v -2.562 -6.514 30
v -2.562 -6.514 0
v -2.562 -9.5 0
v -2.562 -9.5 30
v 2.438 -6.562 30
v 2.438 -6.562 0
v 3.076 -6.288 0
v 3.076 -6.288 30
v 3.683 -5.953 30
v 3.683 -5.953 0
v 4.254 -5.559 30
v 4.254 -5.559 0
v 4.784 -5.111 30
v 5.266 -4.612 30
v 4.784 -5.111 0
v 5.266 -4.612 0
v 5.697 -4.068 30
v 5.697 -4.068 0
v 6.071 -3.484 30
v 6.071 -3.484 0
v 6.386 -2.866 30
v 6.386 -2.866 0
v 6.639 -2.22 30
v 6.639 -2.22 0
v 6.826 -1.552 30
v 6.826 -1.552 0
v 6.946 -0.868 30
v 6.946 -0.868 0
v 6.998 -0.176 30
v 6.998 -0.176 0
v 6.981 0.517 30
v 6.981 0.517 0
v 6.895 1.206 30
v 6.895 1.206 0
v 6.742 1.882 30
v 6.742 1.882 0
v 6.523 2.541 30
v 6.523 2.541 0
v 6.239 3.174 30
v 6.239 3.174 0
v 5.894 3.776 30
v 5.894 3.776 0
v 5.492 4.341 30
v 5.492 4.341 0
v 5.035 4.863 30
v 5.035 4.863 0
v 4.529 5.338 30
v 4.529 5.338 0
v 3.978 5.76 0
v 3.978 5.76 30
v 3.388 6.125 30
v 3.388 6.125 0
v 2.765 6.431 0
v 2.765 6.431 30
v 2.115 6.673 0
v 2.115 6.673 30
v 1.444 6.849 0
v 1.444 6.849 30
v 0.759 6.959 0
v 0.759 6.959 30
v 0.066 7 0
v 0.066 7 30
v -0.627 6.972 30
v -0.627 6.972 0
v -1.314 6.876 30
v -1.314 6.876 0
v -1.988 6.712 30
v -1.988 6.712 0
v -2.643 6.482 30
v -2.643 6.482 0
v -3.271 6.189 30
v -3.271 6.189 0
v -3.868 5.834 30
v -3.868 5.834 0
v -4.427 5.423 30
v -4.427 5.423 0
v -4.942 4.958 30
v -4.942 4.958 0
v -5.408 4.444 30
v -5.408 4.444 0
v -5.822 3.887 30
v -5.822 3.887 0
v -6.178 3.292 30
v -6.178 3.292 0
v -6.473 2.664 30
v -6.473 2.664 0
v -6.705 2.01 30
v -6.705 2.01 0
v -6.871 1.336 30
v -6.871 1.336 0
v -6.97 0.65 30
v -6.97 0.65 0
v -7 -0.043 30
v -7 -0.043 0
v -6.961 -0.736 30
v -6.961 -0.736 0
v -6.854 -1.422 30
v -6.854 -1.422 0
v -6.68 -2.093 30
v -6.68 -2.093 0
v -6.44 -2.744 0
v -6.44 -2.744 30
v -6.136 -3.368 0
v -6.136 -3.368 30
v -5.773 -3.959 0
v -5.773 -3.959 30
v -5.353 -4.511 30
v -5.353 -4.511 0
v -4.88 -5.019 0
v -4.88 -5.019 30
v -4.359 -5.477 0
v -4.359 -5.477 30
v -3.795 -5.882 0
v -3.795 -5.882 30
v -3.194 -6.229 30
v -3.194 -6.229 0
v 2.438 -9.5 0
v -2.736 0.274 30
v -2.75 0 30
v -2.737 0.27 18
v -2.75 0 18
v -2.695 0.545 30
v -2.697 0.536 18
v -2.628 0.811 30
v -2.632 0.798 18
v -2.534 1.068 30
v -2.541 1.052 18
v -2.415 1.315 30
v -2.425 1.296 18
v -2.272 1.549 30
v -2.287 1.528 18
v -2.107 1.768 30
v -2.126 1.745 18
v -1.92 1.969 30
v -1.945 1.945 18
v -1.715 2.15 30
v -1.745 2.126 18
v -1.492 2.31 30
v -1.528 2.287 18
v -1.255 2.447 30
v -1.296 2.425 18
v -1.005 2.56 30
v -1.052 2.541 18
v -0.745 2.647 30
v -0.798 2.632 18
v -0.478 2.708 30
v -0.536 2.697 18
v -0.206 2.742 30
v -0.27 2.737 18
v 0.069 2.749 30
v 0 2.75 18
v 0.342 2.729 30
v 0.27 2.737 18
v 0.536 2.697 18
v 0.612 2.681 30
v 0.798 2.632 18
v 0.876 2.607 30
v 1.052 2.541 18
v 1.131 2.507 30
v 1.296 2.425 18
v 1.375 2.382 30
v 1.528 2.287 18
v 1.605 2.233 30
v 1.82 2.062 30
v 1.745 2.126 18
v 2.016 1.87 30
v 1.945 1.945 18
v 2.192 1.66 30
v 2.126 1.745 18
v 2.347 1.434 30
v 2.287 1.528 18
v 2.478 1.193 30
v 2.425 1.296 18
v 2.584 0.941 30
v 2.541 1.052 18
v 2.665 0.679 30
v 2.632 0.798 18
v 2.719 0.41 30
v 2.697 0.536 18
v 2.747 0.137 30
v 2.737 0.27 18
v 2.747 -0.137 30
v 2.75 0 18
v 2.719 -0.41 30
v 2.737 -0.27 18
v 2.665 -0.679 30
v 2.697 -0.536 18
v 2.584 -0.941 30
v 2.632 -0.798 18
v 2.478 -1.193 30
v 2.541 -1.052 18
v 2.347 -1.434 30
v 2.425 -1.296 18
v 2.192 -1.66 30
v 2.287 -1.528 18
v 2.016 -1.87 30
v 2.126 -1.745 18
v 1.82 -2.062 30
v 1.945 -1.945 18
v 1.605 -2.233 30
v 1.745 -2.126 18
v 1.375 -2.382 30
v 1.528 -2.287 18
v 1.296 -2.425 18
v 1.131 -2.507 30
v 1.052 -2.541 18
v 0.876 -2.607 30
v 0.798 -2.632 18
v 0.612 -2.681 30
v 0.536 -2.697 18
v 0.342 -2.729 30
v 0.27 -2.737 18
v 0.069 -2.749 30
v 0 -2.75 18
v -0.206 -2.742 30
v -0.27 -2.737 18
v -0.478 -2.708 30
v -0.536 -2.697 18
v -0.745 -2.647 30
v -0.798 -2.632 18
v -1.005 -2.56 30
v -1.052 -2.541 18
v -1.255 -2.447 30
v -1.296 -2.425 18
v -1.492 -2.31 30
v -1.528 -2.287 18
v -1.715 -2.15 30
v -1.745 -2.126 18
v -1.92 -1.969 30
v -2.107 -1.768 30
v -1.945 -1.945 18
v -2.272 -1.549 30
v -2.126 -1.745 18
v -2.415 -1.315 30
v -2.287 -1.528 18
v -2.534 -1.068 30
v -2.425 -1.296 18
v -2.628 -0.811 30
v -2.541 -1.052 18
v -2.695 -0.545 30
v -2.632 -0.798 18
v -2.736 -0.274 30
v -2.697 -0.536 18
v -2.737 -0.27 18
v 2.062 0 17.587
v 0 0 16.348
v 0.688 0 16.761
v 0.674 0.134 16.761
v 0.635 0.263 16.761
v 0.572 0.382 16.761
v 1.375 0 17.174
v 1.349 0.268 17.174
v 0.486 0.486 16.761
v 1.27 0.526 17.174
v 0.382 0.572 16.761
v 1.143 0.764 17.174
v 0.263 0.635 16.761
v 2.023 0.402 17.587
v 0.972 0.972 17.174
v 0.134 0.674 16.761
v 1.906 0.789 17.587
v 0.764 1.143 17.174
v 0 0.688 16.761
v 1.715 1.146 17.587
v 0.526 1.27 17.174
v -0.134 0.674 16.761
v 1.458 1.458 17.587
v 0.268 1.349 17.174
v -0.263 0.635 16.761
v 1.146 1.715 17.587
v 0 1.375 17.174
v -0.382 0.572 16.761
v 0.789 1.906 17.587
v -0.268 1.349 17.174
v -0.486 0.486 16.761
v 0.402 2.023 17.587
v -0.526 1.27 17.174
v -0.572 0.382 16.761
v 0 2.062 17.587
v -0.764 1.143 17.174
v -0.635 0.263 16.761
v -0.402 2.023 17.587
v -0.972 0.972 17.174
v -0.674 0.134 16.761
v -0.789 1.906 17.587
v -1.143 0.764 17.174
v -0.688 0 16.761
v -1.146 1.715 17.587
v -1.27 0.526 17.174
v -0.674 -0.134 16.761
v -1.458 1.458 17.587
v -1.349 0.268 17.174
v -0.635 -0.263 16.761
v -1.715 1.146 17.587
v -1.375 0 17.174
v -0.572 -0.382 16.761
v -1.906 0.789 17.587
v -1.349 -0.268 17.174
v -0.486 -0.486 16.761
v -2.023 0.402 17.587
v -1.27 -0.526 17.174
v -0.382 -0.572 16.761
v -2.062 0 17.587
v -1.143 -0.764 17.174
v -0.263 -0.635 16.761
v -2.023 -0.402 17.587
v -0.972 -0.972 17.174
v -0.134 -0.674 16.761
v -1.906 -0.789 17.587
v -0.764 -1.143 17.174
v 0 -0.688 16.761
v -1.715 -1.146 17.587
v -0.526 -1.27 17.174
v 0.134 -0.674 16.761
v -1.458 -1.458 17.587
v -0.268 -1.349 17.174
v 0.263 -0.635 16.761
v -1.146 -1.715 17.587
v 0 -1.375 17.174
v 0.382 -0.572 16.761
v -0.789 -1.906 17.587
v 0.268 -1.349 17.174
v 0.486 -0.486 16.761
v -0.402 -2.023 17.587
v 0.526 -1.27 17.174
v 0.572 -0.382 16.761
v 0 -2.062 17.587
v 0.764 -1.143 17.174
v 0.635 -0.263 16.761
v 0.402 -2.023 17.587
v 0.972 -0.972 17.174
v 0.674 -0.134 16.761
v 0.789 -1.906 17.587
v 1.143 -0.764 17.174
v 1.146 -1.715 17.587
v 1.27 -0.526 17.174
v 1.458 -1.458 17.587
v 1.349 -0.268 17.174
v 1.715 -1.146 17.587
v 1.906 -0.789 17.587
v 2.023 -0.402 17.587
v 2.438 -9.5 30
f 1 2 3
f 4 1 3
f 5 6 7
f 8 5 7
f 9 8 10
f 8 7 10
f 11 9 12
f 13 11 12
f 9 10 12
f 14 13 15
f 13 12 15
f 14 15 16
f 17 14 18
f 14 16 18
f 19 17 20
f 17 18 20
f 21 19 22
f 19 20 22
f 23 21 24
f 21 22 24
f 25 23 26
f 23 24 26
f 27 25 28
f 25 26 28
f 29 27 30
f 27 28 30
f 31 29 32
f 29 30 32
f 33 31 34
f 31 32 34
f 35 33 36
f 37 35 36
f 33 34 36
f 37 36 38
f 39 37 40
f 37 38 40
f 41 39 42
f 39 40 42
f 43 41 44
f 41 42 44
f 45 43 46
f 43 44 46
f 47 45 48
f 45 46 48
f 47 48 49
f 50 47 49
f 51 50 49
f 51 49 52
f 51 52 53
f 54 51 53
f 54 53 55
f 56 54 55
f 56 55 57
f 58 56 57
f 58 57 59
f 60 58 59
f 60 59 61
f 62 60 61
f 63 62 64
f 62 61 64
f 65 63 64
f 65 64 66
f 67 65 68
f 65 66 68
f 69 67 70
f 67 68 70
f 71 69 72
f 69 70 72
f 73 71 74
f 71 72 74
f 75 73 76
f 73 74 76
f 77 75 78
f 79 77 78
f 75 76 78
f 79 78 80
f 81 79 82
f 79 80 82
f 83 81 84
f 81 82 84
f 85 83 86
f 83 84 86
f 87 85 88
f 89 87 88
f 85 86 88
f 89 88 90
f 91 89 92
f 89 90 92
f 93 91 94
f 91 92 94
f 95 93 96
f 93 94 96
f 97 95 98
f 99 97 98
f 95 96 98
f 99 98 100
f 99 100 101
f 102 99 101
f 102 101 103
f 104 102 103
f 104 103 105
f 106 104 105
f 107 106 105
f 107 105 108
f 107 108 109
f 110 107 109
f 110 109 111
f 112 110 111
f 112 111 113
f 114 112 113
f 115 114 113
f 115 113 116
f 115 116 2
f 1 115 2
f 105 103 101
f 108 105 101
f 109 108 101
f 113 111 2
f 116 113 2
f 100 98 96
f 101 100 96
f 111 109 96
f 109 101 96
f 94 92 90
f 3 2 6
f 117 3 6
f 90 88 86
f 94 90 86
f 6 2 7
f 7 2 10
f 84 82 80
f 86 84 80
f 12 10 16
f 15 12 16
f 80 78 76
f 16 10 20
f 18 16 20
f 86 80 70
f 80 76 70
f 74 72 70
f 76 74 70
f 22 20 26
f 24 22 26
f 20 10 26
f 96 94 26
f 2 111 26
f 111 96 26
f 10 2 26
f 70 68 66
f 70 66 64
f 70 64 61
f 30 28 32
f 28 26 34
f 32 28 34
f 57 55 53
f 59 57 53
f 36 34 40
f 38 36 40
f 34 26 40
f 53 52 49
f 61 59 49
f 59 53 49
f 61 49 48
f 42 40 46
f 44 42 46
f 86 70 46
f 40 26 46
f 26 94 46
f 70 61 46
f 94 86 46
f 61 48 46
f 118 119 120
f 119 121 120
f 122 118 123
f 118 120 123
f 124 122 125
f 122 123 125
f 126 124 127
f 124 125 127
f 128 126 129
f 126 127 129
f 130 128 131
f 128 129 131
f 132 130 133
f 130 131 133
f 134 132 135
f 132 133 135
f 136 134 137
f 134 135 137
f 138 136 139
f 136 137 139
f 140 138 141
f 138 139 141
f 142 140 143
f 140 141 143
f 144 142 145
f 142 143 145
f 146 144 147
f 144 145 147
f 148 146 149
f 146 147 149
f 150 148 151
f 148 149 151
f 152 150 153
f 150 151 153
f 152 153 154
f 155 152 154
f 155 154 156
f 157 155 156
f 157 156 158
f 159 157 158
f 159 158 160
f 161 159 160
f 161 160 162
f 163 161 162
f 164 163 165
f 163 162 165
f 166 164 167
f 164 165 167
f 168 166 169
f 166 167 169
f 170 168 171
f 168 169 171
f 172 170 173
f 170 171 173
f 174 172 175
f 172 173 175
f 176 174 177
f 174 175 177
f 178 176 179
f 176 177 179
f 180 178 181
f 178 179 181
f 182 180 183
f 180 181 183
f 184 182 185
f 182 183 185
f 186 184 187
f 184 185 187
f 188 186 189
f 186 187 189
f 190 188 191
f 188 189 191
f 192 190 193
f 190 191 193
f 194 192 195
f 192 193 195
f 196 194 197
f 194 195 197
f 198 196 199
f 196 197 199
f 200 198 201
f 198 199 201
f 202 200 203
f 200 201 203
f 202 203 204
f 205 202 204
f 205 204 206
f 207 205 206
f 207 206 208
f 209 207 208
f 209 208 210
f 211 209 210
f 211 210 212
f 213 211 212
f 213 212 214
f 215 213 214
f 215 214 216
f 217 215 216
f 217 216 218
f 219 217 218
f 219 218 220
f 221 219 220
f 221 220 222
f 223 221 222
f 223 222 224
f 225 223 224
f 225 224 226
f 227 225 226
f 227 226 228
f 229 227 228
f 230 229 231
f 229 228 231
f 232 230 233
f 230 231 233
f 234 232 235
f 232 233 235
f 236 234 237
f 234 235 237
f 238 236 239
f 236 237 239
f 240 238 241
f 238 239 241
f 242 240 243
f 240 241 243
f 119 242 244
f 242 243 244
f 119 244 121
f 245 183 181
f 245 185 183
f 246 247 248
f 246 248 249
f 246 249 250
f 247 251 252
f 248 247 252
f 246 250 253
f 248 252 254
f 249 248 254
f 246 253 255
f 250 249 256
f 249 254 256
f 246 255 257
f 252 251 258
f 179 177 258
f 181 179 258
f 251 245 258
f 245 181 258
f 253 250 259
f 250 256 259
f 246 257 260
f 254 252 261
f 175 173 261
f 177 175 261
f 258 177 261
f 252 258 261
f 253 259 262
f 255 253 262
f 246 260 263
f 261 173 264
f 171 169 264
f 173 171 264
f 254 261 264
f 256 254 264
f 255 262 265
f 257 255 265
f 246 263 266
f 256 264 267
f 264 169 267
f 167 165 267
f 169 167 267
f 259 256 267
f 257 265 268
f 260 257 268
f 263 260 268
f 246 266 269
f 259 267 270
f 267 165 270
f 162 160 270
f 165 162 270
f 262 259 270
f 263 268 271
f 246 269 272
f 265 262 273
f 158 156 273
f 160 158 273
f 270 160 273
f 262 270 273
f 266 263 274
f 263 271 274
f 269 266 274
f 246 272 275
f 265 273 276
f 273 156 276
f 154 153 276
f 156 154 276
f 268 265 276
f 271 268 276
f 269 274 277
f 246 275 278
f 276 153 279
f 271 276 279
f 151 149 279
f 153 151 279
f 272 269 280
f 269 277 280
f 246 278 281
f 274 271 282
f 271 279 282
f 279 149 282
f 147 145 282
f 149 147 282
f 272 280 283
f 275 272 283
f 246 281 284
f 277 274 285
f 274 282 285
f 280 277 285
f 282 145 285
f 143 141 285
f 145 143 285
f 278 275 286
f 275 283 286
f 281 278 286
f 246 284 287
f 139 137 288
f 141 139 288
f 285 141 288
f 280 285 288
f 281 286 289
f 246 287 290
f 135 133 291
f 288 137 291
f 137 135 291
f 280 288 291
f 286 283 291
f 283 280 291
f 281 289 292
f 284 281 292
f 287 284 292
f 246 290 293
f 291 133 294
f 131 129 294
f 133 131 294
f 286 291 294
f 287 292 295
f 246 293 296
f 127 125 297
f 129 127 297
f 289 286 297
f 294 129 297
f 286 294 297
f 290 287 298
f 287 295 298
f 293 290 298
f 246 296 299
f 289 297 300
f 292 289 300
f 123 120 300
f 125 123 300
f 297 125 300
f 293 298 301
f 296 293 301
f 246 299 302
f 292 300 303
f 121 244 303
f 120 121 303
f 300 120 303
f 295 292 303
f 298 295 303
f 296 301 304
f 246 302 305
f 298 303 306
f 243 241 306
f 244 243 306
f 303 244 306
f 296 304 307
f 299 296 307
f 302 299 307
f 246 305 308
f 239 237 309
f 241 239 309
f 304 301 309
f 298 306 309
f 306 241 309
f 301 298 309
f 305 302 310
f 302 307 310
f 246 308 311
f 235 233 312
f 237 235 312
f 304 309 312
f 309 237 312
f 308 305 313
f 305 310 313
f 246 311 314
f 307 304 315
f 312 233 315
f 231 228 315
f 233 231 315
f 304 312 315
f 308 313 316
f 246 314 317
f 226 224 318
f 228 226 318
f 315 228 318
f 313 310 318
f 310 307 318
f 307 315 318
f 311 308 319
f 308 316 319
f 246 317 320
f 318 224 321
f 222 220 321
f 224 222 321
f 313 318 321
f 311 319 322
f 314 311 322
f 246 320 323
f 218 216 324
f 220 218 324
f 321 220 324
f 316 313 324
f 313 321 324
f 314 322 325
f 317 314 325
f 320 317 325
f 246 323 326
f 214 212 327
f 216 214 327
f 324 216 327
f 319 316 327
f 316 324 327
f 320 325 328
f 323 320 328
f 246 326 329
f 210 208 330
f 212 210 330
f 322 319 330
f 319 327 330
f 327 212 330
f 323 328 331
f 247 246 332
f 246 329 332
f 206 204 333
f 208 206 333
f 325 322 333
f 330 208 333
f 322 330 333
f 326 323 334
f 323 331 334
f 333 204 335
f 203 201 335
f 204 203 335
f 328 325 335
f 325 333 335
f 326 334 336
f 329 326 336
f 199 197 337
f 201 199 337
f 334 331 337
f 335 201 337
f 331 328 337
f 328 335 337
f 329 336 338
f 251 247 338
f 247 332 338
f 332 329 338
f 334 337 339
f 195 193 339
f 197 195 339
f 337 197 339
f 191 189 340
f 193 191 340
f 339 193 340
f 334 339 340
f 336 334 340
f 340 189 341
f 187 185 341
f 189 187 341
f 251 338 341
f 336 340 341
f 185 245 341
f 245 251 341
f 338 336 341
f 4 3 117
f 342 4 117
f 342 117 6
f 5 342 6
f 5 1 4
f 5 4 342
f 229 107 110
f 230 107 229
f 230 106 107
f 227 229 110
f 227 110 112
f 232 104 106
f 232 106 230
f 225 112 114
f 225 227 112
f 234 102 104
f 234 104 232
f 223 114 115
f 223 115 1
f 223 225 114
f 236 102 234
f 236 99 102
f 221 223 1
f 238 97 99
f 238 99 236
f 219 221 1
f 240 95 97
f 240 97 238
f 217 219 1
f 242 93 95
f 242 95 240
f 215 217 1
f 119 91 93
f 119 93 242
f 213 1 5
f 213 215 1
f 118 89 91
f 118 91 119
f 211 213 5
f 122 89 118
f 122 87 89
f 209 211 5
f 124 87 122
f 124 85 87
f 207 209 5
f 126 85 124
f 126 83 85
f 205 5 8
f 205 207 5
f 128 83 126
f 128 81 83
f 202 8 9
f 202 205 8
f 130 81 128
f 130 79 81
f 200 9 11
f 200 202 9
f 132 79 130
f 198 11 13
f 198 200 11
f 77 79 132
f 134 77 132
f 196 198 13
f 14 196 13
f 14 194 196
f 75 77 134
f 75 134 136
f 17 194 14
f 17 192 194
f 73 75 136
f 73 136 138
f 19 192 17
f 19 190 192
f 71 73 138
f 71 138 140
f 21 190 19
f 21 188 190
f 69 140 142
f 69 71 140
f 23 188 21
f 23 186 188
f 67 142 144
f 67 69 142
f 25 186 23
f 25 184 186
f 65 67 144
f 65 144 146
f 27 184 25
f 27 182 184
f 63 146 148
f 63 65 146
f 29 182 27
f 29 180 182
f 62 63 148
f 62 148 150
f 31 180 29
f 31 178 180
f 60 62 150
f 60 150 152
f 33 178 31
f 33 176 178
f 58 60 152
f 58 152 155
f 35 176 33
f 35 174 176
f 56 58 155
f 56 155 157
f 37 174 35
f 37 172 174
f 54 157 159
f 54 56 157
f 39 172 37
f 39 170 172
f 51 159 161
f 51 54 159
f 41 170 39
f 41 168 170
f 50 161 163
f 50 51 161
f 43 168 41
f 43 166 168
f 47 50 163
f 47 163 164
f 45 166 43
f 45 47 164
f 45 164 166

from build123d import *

# Parameters (mm, degrees)
F1_DEPTH = 30
F3_D     = 5.5
F3_DEPTH = 12
F3_TIP   = 1.6523667023


with BuildPart() as f1:
    # F0 (on Top) → F1 (new body)
    with BuildSketch(Plane.XY):
        with BuildLine():
            Line((2.4379568888, -9.5), (2.4379568888, -6.5617349999))
            ThreePointArc((2.4379568888, -6.5617349999), (0.0664242114, 6.9996848375), (-2.5620431112, -6.5142869983))
            Line((-2.5620431112, -6.5142869983), (-2.5620431112, -9.5))
            Line((-2.5620431112, -9.5), (2.4379568888, -9.5))
        make_face()
    extrude(amount=F1_DEPTH)

    # F3
    with Locations(Plane.XY.offset(30)):
        with Locations((0, 0)):
            Hole(F3_D / 2, depth=F3_DEPTH)
            with Locations((0, 0, -(F3_DEPTH + F3_TIP / 2))):  # 118° drill point
                Cone(0, F3_D / 2, F3_TIP, mode=Mode.SUBTRACT)


solid = f1.part
